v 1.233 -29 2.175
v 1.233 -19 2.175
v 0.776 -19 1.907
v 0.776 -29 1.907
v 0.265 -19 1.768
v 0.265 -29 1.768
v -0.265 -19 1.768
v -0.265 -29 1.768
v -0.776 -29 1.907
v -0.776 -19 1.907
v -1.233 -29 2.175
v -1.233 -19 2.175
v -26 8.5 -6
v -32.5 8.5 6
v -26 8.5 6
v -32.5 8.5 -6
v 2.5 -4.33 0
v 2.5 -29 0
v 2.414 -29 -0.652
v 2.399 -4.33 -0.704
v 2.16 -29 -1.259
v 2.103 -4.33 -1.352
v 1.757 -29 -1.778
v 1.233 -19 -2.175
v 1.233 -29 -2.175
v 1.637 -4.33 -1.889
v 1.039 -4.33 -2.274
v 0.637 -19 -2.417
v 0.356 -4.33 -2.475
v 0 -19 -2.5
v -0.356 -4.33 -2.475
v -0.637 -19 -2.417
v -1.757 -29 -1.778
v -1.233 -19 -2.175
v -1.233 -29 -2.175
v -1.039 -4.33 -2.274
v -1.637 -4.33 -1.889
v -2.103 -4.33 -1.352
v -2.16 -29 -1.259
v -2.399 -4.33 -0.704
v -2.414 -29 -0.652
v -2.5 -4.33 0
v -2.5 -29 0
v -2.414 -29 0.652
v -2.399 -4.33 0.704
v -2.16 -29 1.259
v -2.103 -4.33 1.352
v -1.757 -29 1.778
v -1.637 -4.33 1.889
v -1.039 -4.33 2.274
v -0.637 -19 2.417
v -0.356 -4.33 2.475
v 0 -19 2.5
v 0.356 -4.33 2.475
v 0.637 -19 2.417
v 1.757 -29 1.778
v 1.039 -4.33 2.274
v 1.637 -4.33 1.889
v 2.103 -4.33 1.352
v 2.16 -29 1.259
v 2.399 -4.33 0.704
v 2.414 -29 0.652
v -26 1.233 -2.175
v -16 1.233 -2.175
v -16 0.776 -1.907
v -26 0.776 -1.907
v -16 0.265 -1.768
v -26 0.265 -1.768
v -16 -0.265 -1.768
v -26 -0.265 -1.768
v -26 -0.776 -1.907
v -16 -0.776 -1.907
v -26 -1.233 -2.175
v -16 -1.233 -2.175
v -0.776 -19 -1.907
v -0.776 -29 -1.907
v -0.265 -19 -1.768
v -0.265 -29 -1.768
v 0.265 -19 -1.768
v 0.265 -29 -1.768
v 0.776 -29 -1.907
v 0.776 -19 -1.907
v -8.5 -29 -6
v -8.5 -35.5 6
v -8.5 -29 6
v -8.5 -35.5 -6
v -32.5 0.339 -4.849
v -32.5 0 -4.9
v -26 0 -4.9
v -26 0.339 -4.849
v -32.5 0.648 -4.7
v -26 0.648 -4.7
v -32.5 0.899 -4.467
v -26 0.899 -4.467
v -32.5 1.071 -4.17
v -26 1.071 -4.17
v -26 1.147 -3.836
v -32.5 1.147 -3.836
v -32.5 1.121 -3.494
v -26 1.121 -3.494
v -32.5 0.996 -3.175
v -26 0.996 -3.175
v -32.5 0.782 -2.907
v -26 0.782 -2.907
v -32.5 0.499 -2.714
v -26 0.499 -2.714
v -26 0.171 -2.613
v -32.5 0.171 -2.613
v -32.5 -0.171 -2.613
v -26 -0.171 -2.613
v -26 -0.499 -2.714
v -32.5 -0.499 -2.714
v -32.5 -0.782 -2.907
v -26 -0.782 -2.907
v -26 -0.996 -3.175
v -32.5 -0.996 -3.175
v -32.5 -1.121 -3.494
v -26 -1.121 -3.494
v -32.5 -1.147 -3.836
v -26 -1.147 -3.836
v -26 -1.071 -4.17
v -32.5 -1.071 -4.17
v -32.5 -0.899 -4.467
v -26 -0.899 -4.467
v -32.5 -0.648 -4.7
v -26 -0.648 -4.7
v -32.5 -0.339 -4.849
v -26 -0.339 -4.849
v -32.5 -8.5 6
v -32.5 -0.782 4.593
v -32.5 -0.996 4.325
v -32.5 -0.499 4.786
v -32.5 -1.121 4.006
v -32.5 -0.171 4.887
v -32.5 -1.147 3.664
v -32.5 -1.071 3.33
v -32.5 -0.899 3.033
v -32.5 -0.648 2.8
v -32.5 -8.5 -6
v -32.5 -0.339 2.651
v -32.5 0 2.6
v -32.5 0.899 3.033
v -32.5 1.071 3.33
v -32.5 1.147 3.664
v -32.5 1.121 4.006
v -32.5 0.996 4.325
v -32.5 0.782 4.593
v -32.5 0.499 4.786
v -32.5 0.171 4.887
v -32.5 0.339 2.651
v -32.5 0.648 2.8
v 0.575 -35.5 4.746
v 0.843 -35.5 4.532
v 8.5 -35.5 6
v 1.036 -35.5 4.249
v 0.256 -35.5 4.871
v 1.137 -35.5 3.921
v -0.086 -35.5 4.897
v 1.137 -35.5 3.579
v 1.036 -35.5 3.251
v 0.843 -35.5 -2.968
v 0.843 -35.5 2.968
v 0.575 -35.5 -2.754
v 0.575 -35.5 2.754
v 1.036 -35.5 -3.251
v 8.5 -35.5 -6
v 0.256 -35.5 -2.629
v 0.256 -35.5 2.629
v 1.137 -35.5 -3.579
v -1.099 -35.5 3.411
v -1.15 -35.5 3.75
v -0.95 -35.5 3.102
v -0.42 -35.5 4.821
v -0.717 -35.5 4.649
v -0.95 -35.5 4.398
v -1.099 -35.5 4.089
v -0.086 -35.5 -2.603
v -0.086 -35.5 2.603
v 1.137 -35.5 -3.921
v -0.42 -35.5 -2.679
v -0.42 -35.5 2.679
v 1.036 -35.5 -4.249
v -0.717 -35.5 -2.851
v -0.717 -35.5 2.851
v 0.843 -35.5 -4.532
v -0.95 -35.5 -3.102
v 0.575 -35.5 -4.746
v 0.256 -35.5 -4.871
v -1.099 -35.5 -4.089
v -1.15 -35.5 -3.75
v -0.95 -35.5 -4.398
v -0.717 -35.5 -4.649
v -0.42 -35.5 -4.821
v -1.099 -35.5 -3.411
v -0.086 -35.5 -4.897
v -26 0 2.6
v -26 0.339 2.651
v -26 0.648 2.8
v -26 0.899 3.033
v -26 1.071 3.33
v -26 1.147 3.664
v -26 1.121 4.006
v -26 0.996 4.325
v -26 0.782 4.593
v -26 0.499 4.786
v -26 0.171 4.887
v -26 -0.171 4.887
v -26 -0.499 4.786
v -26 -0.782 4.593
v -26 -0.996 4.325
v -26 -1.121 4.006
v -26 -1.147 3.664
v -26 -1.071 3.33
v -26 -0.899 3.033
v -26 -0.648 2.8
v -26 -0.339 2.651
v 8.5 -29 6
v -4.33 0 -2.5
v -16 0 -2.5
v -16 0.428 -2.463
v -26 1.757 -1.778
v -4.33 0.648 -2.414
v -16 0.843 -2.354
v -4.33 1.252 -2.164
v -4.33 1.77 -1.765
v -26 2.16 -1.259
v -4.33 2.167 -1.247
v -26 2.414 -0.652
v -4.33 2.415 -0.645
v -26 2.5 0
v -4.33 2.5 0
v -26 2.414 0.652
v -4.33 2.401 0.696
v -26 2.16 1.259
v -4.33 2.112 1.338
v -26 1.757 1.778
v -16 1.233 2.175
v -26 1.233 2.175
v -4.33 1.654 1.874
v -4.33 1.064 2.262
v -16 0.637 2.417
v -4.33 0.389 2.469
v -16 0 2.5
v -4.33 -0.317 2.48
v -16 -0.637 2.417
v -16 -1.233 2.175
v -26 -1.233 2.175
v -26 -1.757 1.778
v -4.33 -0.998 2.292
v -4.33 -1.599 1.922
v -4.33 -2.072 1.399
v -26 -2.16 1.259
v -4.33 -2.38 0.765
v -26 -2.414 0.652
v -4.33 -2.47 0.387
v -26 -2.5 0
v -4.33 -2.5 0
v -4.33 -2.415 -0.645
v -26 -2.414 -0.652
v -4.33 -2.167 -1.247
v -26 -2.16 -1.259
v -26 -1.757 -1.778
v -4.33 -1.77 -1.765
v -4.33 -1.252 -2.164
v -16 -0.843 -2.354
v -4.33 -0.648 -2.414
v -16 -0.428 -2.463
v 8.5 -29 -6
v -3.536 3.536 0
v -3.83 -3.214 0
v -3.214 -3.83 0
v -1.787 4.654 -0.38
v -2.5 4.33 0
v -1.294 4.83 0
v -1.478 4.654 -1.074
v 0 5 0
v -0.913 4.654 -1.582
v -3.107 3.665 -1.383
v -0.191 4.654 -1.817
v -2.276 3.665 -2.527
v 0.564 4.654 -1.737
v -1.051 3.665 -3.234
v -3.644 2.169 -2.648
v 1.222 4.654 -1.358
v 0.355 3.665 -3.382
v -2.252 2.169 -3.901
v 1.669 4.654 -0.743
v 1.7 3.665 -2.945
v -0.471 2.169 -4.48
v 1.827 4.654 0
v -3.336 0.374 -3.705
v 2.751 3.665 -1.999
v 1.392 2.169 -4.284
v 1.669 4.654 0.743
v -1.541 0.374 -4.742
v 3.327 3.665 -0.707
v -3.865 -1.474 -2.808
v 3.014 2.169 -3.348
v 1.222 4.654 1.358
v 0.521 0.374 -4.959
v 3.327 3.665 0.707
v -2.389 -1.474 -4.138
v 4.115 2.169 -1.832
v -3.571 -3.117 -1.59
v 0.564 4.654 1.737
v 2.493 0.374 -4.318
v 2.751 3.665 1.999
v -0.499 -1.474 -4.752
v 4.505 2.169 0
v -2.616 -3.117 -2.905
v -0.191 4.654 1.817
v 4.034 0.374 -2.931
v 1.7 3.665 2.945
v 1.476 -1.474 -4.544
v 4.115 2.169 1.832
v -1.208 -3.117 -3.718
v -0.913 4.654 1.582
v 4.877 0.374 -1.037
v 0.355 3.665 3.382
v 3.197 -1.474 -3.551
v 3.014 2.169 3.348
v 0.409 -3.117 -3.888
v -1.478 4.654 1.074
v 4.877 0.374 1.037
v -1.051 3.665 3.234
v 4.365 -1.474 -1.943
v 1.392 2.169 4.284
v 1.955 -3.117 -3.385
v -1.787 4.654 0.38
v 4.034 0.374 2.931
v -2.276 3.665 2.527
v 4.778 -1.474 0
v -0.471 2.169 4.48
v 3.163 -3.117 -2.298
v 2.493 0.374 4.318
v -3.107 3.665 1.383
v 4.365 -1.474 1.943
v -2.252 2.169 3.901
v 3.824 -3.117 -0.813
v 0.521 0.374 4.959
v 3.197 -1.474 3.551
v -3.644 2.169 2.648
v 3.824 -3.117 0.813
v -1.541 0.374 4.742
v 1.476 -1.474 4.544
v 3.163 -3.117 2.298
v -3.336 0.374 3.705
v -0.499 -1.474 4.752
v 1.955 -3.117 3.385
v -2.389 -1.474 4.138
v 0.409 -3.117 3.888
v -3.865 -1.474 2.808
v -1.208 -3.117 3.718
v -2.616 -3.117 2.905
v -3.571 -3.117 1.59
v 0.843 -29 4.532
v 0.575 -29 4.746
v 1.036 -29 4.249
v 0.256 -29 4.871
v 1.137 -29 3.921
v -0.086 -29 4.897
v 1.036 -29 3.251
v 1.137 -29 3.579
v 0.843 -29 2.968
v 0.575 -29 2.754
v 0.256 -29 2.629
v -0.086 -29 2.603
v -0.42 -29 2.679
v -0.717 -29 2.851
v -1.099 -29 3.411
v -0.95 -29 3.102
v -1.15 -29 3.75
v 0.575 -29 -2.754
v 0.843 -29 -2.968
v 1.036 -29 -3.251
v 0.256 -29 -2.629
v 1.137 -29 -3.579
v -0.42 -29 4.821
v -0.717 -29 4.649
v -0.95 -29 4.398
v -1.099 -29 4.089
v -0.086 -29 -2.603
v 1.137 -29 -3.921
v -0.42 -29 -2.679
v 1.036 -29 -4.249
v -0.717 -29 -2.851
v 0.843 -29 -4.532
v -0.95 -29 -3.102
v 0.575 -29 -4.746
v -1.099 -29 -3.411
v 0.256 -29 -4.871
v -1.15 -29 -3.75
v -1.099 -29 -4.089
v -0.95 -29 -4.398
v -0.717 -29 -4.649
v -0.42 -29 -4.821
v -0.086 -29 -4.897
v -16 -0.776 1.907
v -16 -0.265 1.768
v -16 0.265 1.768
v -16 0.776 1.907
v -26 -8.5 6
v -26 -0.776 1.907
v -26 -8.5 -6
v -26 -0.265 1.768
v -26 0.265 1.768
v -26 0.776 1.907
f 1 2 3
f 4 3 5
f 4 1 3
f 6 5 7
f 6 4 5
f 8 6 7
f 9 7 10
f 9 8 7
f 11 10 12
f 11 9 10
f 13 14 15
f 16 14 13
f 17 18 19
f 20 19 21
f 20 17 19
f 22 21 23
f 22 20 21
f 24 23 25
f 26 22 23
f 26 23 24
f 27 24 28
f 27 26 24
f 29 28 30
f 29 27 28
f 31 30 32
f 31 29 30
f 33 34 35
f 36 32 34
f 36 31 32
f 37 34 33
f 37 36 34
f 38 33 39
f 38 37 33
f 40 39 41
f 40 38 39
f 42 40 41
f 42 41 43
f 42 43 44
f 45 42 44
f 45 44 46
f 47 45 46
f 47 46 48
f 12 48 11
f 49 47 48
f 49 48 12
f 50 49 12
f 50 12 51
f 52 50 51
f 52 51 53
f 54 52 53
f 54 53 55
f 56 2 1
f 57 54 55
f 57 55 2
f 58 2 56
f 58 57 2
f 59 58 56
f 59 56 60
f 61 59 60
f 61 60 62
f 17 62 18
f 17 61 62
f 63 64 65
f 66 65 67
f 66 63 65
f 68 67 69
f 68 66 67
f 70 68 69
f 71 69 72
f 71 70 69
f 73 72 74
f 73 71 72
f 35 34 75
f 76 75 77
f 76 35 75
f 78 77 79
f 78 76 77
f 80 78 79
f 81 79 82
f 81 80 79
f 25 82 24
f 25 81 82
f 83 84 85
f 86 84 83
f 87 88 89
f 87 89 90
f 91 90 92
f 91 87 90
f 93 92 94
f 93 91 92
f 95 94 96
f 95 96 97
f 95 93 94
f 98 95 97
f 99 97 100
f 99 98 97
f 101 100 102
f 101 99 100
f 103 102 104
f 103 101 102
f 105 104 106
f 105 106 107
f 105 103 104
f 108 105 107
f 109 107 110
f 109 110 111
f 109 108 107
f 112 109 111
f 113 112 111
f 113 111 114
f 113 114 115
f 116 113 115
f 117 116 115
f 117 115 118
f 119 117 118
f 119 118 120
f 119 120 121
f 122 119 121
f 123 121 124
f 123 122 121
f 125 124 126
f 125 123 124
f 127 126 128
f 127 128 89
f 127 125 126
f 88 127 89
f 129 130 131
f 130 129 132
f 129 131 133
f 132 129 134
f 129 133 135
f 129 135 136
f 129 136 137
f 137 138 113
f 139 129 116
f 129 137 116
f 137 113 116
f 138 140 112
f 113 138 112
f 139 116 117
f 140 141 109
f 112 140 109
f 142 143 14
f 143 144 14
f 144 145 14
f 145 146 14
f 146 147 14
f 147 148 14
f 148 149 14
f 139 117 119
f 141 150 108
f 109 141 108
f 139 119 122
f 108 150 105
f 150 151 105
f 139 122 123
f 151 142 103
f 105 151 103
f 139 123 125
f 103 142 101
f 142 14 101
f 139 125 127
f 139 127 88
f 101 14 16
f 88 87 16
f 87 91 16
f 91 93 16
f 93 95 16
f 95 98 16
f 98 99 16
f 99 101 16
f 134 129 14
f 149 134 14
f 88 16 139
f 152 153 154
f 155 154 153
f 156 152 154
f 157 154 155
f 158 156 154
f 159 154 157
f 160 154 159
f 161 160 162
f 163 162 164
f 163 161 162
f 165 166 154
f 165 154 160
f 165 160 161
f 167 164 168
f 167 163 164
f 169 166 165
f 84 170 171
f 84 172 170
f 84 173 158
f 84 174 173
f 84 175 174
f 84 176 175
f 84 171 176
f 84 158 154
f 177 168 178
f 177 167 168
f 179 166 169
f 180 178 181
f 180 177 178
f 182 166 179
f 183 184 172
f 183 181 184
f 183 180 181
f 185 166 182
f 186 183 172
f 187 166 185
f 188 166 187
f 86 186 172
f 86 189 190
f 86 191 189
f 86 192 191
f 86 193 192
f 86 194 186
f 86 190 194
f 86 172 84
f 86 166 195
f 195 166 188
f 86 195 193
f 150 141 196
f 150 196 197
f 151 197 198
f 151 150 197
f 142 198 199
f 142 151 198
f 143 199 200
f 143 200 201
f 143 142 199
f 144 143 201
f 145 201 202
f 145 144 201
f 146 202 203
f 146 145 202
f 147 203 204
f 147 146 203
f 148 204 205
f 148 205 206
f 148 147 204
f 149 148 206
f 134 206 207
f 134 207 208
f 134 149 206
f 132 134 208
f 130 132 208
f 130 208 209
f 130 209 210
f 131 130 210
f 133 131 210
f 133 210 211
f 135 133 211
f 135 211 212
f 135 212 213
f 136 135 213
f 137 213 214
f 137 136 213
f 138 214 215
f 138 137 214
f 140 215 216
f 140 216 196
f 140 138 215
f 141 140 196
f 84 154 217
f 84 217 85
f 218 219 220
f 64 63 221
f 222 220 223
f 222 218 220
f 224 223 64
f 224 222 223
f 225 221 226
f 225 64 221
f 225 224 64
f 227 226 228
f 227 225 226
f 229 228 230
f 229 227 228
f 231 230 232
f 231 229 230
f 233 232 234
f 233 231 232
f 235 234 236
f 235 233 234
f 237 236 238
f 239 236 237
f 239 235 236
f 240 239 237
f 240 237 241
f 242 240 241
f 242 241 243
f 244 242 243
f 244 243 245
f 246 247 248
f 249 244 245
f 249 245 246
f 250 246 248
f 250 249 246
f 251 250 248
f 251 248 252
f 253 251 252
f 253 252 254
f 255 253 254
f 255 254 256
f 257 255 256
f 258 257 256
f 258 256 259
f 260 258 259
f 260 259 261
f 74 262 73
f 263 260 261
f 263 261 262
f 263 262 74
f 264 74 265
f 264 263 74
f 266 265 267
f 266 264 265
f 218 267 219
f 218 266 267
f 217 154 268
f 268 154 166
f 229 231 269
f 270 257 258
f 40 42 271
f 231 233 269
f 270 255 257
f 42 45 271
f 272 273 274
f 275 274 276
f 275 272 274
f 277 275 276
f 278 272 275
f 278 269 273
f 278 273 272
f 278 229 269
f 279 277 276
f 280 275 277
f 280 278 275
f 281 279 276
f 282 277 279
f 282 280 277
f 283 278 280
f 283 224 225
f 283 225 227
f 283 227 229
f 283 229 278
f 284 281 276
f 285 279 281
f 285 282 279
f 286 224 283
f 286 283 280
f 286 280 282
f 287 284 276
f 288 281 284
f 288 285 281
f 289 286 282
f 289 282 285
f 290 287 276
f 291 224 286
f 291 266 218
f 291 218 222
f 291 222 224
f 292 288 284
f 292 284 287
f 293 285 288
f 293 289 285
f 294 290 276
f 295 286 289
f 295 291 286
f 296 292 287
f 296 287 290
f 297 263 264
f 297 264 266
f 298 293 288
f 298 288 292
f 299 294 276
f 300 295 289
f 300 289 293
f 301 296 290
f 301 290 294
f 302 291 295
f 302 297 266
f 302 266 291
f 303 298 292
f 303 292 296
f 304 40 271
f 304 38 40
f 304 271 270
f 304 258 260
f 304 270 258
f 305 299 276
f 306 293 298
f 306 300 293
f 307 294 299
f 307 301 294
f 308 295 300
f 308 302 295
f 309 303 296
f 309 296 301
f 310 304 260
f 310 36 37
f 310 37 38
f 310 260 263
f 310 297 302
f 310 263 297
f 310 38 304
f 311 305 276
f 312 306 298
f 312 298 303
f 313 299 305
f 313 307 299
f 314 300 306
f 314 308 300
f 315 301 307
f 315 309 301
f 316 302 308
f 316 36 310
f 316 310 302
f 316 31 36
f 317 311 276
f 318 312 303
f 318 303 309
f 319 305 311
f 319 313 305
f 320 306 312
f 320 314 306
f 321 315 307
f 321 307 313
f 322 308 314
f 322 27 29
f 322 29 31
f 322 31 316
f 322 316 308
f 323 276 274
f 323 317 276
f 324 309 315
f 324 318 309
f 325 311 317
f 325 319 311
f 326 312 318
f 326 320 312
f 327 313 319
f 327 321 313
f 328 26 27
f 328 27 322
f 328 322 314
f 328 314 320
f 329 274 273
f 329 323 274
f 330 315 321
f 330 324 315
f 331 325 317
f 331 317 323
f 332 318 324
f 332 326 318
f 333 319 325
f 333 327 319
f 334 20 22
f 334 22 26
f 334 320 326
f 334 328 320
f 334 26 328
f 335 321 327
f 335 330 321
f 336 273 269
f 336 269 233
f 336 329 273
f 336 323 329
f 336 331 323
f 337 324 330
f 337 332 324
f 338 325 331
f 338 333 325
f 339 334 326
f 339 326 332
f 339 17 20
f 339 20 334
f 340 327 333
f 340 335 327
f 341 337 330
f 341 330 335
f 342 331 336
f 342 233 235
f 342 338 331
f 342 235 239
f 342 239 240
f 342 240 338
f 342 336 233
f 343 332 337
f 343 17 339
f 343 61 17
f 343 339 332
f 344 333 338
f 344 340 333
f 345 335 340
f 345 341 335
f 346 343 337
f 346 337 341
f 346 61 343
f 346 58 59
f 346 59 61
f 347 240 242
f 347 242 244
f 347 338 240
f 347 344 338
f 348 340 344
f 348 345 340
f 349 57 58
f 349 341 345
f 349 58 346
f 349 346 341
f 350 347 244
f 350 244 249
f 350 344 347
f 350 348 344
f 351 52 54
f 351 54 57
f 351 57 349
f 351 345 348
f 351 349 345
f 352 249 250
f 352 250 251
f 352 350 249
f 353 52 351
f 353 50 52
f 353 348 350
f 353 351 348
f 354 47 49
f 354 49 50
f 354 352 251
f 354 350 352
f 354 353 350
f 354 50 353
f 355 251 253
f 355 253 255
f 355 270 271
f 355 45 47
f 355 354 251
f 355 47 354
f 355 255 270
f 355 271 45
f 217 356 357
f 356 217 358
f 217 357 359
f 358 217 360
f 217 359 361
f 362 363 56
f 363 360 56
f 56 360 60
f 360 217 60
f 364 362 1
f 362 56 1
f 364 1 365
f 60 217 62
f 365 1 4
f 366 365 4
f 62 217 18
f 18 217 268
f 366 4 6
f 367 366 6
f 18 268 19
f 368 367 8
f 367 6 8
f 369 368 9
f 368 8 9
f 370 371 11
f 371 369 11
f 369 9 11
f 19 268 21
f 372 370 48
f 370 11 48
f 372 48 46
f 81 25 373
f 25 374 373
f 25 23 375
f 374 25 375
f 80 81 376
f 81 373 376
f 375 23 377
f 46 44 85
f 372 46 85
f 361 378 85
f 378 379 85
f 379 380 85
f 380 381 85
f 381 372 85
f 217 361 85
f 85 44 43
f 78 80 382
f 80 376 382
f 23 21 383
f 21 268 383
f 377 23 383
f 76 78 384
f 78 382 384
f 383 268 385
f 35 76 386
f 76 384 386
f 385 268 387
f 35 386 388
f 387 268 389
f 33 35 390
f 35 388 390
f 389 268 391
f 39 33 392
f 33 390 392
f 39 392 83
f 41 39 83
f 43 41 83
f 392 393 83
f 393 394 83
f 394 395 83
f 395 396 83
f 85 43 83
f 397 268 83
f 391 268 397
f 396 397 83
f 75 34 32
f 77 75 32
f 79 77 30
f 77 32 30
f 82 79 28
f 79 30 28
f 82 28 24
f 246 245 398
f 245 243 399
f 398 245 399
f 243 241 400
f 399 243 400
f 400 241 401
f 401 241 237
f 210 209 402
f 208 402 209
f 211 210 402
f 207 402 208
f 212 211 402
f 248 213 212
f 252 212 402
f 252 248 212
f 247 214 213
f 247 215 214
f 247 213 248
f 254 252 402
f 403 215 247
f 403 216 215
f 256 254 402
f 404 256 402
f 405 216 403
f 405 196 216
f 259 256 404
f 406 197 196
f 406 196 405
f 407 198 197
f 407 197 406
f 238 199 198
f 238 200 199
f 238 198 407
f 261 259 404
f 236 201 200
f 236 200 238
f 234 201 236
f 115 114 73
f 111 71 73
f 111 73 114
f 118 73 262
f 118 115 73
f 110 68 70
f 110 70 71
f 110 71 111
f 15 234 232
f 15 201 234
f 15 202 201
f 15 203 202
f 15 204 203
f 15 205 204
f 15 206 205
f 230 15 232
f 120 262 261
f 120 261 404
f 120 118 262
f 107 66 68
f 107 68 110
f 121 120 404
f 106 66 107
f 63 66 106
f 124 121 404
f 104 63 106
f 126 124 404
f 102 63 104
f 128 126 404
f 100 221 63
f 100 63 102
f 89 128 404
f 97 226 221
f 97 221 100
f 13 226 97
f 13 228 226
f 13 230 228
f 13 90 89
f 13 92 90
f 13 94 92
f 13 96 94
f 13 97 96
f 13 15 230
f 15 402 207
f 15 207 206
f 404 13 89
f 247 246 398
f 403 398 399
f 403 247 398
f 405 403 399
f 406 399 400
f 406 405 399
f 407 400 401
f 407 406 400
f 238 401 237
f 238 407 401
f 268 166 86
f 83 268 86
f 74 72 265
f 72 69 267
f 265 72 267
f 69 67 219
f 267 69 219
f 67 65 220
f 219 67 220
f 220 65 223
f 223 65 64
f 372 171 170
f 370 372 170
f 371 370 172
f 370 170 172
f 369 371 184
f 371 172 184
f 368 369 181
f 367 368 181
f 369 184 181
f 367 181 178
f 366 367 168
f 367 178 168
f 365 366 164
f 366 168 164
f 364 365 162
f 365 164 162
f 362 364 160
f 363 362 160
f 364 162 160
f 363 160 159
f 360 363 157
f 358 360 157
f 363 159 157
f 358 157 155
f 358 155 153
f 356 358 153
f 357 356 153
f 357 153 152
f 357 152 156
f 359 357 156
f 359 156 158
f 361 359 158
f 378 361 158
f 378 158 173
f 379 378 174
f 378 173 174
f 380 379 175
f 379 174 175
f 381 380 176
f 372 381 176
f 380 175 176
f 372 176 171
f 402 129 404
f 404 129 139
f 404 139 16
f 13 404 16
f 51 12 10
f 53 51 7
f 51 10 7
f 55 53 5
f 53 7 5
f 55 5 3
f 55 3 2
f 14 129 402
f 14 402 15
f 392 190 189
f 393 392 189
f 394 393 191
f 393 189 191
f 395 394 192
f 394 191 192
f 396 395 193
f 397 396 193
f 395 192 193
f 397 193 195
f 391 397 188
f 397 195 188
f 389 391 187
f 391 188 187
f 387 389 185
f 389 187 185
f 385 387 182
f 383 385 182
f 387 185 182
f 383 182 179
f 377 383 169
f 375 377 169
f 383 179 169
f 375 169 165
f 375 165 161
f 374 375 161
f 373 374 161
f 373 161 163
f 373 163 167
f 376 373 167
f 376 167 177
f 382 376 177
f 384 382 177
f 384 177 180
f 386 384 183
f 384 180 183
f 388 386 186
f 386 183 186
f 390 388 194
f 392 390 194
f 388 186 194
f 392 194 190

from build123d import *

# Parameters (mm, degrees)
SKETCH_2_R          = 2.5
EXTRUDE_1_DEPTH     = 29
SKETCH_3_R          = 2.5
EXTRUDE_2_DEPTH     = 26
SKETCH_5_W          = 17
SKETCH_5_H          = 12
SKETCH_5_R          = 1.15
EXTRUDE_4_DEPTH     = 6.5
SKETCH_6_R          = 2
CUT_EXTRUDE_1_DEPTH = 10
SKETCH_7_W          = 12
SKETCH_7_H          = 17
SKETCH_7_R          = 1.15
EXTRUDE_5_DEPTH     = 6.5
SKETCH_8_R          = 2
CUT_EXTRUDE_2_DEPTH = 10


with BuildPart() as part:
    # 스케치1 → 회전1 (revolve)
    with BuildSketch(Plane.XY):
        with BuildLine():
            Line((0, -5), (0, 5))
            ThreePointArc((0, 5), (-5, 0), (0, -5))
        make_face()
    revolve(axis=Axis((0, 7.642806544, 0), (0, -1, 0)))

    # 스케치2 → 보스-돌출1 (add)
    with BuildSketch(Plane(origin=(0, 0, 0), x_dir=(1, 0, 0), z_dir=(0, 1, 0))):
        Circle(SKETCH_2_R)
    extrude(amount=-EXTRUDE_1_DEPTH)

    # 스케치3 → 보스-돌출2 (add)
    with BuildSketch(Plane(origin=(0, 0, 0), x_dir=(0, 0, -1), z_dir=(1, 0, 0))):
        Circle(SKETCH_3_R)
    extrude(amount=-EXTRUDE_2_DEPTH)

    # 스케치5 → 보스-돌출4 (add)
    with BuildSketch(Plane(origin=(0, -35.5, 0), x_dir=(-1, 0, 0), z_dir=(0, -1, 0))):
        Rectangle(SKETCH_5_W, SKETCH_5_H)
        with Locations((0, 3.75)):
            Circle(SKETCH_5_R, mode=Mode.SUBTRACT)
        with Locations((0, -3.75)):
            Circle(SKETCH_5_R, mode=Mode.SUBTRACT)
    extrude(amount=-EXTRUDE_4_DEPTH)

    # 스케치6 → 컷-돌출1 (cut)
    with BuildSketch(Plane(origin=(0, -29, 0), x_dir=(1, 0, 0), z_dir=(0, 1, 0))):
        with Locations((0, 3.75)):
            Circle(SKETCH_6_R)
        with Locations((0, -3.75)):
            Circle(SKETCH_6_R)
    extrude(amount=CUT_EXTRUDE_1_DEPTH, mode=Mode.SUBTRACT)

    # 스케치7 → 보스-돌출5 (add)
    with BuildSketch(Plane(origin=(-32.5, 0, 0), x_dir=(0, 0, -1), z_dir=(1, 0, 0))):
        Rectangle(SKETCH_7_W, SKETCH_7_H)
        with Locations((-3.75, 0)):
            Circle(SKETCH_7_R, mode=Mode.SUBTRACT)
        with Locations((3.75, 0)):
            Circle(SKETCH_7_R, mode=Mode.SUBTRACT)
    extrude(amount=EXTRUDE_5_DEPTH)

    # 스케치8 → 컷-돌출2 (cut)
    with BuildSketch(Plane(origin=(-26, 0, 0), x_dir=(0, 0, -1), z_dir=(1, 0, 0))):
        with Locations((-3.75, 0)):
            Circle(SKETCH_8_R)
        with Locations((3.75, 0)):
            Circle(SKETCH_8_R)
    extrude(amount=CUT_EXTRUDE_2_DEPTH, mode=Mode.SUBTRACT)


solid = part.part
